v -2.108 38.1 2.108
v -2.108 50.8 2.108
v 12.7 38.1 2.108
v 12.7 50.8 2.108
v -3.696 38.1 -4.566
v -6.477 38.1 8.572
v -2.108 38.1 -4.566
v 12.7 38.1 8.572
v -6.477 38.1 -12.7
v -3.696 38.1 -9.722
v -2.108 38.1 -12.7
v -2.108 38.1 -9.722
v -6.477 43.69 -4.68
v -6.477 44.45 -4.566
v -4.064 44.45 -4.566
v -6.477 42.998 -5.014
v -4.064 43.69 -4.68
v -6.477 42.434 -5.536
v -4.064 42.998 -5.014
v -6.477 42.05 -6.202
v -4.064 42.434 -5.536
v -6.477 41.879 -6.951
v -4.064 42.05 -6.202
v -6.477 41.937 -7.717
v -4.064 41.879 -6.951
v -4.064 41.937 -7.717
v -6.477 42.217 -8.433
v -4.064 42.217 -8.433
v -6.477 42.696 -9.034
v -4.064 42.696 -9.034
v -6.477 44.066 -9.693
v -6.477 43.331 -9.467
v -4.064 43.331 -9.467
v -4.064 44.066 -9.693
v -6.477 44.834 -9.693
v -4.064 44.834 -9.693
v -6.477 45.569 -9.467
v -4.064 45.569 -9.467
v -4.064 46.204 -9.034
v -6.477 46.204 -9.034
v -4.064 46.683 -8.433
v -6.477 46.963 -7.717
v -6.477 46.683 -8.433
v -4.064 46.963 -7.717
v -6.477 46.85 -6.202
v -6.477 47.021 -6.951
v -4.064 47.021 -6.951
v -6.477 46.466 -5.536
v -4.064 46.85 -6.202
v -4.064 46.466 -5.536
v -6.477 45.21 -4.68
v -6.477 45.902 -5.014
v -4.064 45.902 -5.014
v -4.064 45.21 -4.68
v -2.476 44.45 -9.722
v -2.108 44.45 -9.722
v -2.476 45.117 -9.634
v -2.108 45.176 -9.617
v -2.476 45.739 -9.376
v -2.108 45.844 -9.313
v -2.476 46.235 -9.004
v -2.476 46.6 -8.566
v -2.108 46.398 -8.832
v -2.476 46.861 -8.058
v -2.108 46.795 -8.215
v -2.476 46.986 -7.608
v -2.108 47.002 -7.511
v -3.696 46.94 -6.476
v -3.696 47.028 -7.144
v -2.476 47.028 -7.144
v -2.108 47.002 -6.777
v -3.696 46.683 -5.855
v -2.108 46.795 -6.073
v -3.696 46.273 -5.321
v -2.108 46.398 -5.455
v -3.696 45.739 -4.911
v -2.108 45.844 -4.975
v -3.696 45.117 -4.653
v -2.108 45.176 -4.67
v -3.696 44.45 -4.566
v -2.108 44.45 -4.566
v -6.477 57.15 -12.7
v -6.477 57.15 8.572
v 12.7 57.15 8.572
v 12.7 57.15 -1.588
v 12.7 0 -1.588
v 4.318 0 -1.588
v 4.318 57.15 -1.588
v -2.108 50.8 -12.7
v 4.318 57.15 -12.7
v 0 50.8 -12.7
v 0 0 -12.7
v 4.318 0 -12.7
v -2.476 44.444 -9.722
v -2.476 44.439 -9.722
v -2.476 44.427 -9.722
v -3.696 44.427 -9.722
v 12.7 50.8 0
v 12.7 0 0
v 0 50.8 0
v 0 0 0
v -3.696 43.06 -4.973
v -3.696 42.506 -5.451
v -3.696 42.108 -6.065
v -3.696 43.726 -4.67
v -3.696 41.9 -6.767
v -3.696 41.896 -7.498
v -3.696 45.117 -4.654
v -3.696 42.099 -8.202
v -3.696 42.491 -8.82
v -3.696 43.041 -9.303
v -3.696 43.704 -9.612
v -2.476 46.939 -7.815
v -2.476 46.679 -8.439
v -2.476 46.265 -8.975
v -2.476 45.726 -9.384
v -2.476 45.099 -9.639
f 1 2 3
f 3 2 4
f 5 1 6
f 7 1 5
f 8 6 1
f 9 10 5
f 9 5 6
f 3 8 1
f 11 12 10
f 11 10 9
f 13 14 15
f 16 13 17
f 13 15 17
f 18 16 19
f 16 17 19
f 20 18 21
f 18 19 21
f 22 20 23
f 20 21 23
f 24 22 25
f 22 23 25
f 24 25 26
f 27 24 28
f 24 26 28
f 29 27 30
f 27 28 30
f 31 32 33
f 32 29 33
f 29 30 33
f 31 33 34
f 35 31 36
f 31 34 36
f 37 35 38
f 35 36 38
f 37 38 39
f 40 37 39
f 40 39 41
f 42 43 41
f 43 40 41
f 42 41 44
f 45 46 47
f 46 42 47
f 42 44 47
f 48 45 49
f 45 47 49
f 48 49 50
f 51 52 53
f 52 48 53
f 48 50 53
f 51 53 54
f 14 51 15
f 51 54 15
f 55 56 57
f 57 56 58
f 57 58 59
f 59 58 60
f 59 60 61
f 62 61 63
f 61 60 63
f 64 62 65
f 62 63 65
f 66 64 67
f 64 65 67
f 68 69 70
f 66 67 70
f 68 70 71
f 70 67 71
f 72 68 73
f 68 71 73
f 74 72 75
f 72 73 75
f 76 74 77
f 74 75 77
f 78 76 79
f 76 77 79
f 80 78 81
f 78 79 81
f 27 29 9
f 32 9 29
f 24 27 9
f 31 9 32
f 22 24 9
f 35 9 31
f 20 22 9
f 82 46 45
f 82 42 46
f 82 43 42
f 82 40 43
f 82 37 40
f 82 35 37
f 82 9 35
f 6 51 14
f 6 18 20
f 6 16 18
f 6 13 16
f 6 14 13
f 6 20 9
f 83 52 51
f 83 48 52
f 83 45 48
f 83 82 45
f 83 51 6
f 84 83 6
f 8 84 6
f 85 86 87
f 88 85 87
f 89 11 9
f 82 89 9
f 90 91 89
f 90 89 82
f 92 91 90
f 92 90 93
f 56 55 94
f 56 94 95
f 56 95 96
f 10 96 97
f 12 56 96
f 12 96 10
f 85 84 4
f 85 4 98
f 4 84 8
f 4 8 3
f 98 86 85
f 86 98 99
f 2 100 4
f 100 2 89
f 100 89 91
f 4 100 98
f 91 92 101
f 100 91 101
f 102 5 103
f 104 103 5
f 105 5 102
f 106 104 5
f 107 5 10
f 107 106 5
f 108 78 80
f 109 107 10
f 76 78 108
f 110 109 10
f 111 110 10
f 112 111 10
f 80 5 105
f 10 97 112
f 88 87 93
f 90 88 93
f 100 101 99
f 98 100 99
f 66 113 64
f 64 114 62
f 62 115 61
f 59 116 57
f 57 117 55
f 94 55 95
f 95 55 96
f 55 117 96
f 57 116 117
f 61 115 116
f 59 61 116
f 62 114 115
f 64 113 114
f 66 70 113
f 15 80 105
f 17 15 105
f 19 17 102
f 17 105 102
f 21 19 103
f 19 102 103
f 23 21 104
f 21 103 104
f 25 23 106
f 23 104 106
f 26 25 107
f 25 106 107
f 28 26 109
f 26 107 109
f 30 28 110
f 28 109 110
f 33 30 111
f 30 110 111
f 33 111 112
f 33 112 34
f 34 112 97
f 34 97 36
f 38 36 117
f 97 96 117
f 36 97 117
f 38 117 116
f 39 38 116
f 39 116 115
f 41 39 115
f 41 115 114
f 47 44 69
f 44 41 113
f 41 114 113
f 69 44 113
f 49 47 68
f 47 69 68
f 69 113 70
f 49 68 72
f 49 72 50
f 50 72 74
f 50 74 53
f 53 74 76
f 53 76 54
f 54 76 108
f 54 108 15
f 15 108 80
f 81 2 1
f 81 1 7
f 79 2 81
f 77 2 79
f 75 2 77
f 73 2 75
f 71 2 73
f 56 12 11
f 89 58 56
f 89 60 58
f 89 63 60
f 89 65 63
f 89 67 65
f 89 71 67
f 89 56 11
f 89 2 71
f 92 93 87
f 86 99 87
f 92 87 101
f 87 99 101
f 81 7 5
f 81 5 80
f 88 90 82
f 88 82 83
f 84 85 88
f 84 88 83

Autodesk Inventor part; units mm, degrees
ref_plane "YZ Plane" through (0, 0, 0) normal (1, 0, 0) x (0, 1, 0)
ref_plane "XZ Plane" through (0, 0, 0) normal (0, 1, 0) x (-1, 0, 0)
ref_plane "XY Plane" through (0, 0, 0) normal (0, 0, 1) x (1, 0, 0)
sketch "Sketch1" plane through (0, 0, 0) normal (0, 1, 0) x (-1, 0, 0)
  line L0 (0, 0) -> (-12.7, 0)
  line L1 (-12.7, 0) -> (-12.7, -1.5875)
  line L2 (-12.7, -1.5875) -> (0, -1.5875)
  line L3 (0, -1.5875) -> (0, 0)
  line L4 (0, 0) -> (-4.318, 0)
  line L5 (-4.318, 0) -> (-4.318, -12.7)
  line L6 (-4.318, -12.7) -> (0, -12.7)
  line L7 (0, -12.7) -> (0, 0)
  dimension "d0" = 4.318
  dimension "d1" = 12.7
  dimension "d2" = 12.7
  dimension "d33" = 1.5875
extrude "Extrusion1" add sketch "Sketch1" along normal blind 50.8
sketch "Sketch2" plane through (0, 50.8, 0) normal (0, 1, 0) x (1, 0, 0)
  line L0 (12.7, 0) -> (12.7, 1.5875) projected
  line L1 (12.7, 1.5875) -> (-4.064, 1.5875)
  line L2 (-4.064, 1.5875) -> (-4.064, -8.5725)
  line L3 (-4.064, -8.5725) -> (12.7, -8.5725)
  line L4 (12.7, -8.5725) -> (12.7, 1.5875)
  line L5 (4.318, 12.7) -> (-4.064, 12.7)
  line L6 (-4.064, 12.7) -> (-4.064, -8.5725)
  line L7 (-4.064, -8.5725) -> (4.318, -8.5725)
  line L8 (4.318, -8.5725) -> (4.318, 12.7)
  dimension "d26" = 10.16
  dimension "d28" = 16.764
extrude "Extrusion2" add sketch "Sketch2" along normal blind 6.35
sketch "Sketch5" plane through (0, 50.8, 0) normal (0, -1, 0) x (1, 0, 0)
  line L0 (12.7, 8.5725) -> (12.7, 0) projected
  line L1 (-4.064, -12.7) -> (-4.064, 8.5725) projected
  line L2 (12.7, 8.5725) -> (-4.064, 8.5725)
  line L3 (-4.064, 8.5725) -> (-4.064, 2.1082)
  line L4 (-4.064, 2.1082) -> (12.7, 2.1082)
  line L5 (12.7, 2.1082) -> (12.7, 8.5725)
  line L6 (0, -12.7) -> (-4.064, -12.7) projected
  line L7 (-4.064, 8.5725) -> (-2.1082, 8.5725)
  line L8 (-2.1082, 8.5725) -> (-2.1082, -12.7)
  line L9 (-2.1082, -12.7) -> (-4.064, -12.7)
  line L10 (-4.064, -12.7) -> (-4.064, 8.5725)
  line L11 (0, -12.7) -> (0, 0) projected
  line L12 (0, 0) -> (12.7, 0) projected
  dimension "d29" = 2.1082
  dimension "d30" = 2.1082
extrude "Extrusion4" add sketch "Sketch5" along normal blind 12.7 contours L0 L4 L8 L2 | L8 L4 L1 L2 | L8 L6 L1 L4
sketch "Sketch7" plane through (-4.064, 57.15, -12.7) normal (-1, 0, 0) x (0, 0, 1)
  line L0 (11.1125, 0) -> (11.1125, -57.15) projected
  line L1 (0, -57.15) -> (0, 0) projected
  line L2 (11.1125, 0) -> (0, 0) projected
  line L3 (0, -19.05) -> (14.8082, -19.05) projected
  line L4 (0, -6.35) -> (12.7, -6.35) projected
  point P0 (12.7, -57.15)
  point P1 (5.5562, -12.7)
  dimension "d47" = 11.1125
  dimension "d49" = 5.5563
  dimension "d58" = 12.7
  dimension "d59" = 6.35
hole "Hole2" at (-4.064, 44.45, -7.1438) direction (1, 0, 0) diameter 5.1562 depth 1.5875 tip angle 118
sketch "Sketch8" plane through (-4.064, 57.15, -12.7) normal (-1, 0, 0) x (0, 0, 1)
  circle A0 centre (5.5562, -12.7) radius 2.5781 projected
  circle A1 centre (5.5562, -12.7) radius 2.5781 projected
  line L0 (21.2725, 0) -> (21.2725, -19.05) projected
  line L1 (0, 0) -> (21.2725, 0) projected
  line L2 (0, -19.05) -> (0, 0) projected
  line L3 (21.2725, -19.05) -> (0, -19.05) projected
  point P0 (12.7, -57.15)
extrude "Extrusion5" add sketch "Sketch8" along normal blind 2.413
sketch "Sketch9" plane through (-2.1082, 50.8, 2.1082) normal (1, 0, 0) x (0, 0, -1)
  circle A0 centre (9.2519, -6.35) radius 2.5781 projected
  line L0 (14.8082, -12.7) -> (-6.4643, -12.7) projected
  line L1 (6.6738, -6.35) -> (11.83, -6.35)
  line L2 (11.83, -6.35) -> (11.83, -12.7)
  line L3 (11.83, -12.7) -> (6.6738, -12.7)
  line L4 (6.6738, -12.7) -> (6.6738, -6.35)
  point P0 (2.1082, -50.8)
  dimension "d62" = 5.1562
extrude "Extrusion6" cut sketch "Sketch9" against normal blind 1.5875
equation "\"d29\" = d30"
equation "\"d49\" = 0.5 * d47"
equation "\"d59\" = 0.5 * d58"
properties part number "8GrootTelescope"
